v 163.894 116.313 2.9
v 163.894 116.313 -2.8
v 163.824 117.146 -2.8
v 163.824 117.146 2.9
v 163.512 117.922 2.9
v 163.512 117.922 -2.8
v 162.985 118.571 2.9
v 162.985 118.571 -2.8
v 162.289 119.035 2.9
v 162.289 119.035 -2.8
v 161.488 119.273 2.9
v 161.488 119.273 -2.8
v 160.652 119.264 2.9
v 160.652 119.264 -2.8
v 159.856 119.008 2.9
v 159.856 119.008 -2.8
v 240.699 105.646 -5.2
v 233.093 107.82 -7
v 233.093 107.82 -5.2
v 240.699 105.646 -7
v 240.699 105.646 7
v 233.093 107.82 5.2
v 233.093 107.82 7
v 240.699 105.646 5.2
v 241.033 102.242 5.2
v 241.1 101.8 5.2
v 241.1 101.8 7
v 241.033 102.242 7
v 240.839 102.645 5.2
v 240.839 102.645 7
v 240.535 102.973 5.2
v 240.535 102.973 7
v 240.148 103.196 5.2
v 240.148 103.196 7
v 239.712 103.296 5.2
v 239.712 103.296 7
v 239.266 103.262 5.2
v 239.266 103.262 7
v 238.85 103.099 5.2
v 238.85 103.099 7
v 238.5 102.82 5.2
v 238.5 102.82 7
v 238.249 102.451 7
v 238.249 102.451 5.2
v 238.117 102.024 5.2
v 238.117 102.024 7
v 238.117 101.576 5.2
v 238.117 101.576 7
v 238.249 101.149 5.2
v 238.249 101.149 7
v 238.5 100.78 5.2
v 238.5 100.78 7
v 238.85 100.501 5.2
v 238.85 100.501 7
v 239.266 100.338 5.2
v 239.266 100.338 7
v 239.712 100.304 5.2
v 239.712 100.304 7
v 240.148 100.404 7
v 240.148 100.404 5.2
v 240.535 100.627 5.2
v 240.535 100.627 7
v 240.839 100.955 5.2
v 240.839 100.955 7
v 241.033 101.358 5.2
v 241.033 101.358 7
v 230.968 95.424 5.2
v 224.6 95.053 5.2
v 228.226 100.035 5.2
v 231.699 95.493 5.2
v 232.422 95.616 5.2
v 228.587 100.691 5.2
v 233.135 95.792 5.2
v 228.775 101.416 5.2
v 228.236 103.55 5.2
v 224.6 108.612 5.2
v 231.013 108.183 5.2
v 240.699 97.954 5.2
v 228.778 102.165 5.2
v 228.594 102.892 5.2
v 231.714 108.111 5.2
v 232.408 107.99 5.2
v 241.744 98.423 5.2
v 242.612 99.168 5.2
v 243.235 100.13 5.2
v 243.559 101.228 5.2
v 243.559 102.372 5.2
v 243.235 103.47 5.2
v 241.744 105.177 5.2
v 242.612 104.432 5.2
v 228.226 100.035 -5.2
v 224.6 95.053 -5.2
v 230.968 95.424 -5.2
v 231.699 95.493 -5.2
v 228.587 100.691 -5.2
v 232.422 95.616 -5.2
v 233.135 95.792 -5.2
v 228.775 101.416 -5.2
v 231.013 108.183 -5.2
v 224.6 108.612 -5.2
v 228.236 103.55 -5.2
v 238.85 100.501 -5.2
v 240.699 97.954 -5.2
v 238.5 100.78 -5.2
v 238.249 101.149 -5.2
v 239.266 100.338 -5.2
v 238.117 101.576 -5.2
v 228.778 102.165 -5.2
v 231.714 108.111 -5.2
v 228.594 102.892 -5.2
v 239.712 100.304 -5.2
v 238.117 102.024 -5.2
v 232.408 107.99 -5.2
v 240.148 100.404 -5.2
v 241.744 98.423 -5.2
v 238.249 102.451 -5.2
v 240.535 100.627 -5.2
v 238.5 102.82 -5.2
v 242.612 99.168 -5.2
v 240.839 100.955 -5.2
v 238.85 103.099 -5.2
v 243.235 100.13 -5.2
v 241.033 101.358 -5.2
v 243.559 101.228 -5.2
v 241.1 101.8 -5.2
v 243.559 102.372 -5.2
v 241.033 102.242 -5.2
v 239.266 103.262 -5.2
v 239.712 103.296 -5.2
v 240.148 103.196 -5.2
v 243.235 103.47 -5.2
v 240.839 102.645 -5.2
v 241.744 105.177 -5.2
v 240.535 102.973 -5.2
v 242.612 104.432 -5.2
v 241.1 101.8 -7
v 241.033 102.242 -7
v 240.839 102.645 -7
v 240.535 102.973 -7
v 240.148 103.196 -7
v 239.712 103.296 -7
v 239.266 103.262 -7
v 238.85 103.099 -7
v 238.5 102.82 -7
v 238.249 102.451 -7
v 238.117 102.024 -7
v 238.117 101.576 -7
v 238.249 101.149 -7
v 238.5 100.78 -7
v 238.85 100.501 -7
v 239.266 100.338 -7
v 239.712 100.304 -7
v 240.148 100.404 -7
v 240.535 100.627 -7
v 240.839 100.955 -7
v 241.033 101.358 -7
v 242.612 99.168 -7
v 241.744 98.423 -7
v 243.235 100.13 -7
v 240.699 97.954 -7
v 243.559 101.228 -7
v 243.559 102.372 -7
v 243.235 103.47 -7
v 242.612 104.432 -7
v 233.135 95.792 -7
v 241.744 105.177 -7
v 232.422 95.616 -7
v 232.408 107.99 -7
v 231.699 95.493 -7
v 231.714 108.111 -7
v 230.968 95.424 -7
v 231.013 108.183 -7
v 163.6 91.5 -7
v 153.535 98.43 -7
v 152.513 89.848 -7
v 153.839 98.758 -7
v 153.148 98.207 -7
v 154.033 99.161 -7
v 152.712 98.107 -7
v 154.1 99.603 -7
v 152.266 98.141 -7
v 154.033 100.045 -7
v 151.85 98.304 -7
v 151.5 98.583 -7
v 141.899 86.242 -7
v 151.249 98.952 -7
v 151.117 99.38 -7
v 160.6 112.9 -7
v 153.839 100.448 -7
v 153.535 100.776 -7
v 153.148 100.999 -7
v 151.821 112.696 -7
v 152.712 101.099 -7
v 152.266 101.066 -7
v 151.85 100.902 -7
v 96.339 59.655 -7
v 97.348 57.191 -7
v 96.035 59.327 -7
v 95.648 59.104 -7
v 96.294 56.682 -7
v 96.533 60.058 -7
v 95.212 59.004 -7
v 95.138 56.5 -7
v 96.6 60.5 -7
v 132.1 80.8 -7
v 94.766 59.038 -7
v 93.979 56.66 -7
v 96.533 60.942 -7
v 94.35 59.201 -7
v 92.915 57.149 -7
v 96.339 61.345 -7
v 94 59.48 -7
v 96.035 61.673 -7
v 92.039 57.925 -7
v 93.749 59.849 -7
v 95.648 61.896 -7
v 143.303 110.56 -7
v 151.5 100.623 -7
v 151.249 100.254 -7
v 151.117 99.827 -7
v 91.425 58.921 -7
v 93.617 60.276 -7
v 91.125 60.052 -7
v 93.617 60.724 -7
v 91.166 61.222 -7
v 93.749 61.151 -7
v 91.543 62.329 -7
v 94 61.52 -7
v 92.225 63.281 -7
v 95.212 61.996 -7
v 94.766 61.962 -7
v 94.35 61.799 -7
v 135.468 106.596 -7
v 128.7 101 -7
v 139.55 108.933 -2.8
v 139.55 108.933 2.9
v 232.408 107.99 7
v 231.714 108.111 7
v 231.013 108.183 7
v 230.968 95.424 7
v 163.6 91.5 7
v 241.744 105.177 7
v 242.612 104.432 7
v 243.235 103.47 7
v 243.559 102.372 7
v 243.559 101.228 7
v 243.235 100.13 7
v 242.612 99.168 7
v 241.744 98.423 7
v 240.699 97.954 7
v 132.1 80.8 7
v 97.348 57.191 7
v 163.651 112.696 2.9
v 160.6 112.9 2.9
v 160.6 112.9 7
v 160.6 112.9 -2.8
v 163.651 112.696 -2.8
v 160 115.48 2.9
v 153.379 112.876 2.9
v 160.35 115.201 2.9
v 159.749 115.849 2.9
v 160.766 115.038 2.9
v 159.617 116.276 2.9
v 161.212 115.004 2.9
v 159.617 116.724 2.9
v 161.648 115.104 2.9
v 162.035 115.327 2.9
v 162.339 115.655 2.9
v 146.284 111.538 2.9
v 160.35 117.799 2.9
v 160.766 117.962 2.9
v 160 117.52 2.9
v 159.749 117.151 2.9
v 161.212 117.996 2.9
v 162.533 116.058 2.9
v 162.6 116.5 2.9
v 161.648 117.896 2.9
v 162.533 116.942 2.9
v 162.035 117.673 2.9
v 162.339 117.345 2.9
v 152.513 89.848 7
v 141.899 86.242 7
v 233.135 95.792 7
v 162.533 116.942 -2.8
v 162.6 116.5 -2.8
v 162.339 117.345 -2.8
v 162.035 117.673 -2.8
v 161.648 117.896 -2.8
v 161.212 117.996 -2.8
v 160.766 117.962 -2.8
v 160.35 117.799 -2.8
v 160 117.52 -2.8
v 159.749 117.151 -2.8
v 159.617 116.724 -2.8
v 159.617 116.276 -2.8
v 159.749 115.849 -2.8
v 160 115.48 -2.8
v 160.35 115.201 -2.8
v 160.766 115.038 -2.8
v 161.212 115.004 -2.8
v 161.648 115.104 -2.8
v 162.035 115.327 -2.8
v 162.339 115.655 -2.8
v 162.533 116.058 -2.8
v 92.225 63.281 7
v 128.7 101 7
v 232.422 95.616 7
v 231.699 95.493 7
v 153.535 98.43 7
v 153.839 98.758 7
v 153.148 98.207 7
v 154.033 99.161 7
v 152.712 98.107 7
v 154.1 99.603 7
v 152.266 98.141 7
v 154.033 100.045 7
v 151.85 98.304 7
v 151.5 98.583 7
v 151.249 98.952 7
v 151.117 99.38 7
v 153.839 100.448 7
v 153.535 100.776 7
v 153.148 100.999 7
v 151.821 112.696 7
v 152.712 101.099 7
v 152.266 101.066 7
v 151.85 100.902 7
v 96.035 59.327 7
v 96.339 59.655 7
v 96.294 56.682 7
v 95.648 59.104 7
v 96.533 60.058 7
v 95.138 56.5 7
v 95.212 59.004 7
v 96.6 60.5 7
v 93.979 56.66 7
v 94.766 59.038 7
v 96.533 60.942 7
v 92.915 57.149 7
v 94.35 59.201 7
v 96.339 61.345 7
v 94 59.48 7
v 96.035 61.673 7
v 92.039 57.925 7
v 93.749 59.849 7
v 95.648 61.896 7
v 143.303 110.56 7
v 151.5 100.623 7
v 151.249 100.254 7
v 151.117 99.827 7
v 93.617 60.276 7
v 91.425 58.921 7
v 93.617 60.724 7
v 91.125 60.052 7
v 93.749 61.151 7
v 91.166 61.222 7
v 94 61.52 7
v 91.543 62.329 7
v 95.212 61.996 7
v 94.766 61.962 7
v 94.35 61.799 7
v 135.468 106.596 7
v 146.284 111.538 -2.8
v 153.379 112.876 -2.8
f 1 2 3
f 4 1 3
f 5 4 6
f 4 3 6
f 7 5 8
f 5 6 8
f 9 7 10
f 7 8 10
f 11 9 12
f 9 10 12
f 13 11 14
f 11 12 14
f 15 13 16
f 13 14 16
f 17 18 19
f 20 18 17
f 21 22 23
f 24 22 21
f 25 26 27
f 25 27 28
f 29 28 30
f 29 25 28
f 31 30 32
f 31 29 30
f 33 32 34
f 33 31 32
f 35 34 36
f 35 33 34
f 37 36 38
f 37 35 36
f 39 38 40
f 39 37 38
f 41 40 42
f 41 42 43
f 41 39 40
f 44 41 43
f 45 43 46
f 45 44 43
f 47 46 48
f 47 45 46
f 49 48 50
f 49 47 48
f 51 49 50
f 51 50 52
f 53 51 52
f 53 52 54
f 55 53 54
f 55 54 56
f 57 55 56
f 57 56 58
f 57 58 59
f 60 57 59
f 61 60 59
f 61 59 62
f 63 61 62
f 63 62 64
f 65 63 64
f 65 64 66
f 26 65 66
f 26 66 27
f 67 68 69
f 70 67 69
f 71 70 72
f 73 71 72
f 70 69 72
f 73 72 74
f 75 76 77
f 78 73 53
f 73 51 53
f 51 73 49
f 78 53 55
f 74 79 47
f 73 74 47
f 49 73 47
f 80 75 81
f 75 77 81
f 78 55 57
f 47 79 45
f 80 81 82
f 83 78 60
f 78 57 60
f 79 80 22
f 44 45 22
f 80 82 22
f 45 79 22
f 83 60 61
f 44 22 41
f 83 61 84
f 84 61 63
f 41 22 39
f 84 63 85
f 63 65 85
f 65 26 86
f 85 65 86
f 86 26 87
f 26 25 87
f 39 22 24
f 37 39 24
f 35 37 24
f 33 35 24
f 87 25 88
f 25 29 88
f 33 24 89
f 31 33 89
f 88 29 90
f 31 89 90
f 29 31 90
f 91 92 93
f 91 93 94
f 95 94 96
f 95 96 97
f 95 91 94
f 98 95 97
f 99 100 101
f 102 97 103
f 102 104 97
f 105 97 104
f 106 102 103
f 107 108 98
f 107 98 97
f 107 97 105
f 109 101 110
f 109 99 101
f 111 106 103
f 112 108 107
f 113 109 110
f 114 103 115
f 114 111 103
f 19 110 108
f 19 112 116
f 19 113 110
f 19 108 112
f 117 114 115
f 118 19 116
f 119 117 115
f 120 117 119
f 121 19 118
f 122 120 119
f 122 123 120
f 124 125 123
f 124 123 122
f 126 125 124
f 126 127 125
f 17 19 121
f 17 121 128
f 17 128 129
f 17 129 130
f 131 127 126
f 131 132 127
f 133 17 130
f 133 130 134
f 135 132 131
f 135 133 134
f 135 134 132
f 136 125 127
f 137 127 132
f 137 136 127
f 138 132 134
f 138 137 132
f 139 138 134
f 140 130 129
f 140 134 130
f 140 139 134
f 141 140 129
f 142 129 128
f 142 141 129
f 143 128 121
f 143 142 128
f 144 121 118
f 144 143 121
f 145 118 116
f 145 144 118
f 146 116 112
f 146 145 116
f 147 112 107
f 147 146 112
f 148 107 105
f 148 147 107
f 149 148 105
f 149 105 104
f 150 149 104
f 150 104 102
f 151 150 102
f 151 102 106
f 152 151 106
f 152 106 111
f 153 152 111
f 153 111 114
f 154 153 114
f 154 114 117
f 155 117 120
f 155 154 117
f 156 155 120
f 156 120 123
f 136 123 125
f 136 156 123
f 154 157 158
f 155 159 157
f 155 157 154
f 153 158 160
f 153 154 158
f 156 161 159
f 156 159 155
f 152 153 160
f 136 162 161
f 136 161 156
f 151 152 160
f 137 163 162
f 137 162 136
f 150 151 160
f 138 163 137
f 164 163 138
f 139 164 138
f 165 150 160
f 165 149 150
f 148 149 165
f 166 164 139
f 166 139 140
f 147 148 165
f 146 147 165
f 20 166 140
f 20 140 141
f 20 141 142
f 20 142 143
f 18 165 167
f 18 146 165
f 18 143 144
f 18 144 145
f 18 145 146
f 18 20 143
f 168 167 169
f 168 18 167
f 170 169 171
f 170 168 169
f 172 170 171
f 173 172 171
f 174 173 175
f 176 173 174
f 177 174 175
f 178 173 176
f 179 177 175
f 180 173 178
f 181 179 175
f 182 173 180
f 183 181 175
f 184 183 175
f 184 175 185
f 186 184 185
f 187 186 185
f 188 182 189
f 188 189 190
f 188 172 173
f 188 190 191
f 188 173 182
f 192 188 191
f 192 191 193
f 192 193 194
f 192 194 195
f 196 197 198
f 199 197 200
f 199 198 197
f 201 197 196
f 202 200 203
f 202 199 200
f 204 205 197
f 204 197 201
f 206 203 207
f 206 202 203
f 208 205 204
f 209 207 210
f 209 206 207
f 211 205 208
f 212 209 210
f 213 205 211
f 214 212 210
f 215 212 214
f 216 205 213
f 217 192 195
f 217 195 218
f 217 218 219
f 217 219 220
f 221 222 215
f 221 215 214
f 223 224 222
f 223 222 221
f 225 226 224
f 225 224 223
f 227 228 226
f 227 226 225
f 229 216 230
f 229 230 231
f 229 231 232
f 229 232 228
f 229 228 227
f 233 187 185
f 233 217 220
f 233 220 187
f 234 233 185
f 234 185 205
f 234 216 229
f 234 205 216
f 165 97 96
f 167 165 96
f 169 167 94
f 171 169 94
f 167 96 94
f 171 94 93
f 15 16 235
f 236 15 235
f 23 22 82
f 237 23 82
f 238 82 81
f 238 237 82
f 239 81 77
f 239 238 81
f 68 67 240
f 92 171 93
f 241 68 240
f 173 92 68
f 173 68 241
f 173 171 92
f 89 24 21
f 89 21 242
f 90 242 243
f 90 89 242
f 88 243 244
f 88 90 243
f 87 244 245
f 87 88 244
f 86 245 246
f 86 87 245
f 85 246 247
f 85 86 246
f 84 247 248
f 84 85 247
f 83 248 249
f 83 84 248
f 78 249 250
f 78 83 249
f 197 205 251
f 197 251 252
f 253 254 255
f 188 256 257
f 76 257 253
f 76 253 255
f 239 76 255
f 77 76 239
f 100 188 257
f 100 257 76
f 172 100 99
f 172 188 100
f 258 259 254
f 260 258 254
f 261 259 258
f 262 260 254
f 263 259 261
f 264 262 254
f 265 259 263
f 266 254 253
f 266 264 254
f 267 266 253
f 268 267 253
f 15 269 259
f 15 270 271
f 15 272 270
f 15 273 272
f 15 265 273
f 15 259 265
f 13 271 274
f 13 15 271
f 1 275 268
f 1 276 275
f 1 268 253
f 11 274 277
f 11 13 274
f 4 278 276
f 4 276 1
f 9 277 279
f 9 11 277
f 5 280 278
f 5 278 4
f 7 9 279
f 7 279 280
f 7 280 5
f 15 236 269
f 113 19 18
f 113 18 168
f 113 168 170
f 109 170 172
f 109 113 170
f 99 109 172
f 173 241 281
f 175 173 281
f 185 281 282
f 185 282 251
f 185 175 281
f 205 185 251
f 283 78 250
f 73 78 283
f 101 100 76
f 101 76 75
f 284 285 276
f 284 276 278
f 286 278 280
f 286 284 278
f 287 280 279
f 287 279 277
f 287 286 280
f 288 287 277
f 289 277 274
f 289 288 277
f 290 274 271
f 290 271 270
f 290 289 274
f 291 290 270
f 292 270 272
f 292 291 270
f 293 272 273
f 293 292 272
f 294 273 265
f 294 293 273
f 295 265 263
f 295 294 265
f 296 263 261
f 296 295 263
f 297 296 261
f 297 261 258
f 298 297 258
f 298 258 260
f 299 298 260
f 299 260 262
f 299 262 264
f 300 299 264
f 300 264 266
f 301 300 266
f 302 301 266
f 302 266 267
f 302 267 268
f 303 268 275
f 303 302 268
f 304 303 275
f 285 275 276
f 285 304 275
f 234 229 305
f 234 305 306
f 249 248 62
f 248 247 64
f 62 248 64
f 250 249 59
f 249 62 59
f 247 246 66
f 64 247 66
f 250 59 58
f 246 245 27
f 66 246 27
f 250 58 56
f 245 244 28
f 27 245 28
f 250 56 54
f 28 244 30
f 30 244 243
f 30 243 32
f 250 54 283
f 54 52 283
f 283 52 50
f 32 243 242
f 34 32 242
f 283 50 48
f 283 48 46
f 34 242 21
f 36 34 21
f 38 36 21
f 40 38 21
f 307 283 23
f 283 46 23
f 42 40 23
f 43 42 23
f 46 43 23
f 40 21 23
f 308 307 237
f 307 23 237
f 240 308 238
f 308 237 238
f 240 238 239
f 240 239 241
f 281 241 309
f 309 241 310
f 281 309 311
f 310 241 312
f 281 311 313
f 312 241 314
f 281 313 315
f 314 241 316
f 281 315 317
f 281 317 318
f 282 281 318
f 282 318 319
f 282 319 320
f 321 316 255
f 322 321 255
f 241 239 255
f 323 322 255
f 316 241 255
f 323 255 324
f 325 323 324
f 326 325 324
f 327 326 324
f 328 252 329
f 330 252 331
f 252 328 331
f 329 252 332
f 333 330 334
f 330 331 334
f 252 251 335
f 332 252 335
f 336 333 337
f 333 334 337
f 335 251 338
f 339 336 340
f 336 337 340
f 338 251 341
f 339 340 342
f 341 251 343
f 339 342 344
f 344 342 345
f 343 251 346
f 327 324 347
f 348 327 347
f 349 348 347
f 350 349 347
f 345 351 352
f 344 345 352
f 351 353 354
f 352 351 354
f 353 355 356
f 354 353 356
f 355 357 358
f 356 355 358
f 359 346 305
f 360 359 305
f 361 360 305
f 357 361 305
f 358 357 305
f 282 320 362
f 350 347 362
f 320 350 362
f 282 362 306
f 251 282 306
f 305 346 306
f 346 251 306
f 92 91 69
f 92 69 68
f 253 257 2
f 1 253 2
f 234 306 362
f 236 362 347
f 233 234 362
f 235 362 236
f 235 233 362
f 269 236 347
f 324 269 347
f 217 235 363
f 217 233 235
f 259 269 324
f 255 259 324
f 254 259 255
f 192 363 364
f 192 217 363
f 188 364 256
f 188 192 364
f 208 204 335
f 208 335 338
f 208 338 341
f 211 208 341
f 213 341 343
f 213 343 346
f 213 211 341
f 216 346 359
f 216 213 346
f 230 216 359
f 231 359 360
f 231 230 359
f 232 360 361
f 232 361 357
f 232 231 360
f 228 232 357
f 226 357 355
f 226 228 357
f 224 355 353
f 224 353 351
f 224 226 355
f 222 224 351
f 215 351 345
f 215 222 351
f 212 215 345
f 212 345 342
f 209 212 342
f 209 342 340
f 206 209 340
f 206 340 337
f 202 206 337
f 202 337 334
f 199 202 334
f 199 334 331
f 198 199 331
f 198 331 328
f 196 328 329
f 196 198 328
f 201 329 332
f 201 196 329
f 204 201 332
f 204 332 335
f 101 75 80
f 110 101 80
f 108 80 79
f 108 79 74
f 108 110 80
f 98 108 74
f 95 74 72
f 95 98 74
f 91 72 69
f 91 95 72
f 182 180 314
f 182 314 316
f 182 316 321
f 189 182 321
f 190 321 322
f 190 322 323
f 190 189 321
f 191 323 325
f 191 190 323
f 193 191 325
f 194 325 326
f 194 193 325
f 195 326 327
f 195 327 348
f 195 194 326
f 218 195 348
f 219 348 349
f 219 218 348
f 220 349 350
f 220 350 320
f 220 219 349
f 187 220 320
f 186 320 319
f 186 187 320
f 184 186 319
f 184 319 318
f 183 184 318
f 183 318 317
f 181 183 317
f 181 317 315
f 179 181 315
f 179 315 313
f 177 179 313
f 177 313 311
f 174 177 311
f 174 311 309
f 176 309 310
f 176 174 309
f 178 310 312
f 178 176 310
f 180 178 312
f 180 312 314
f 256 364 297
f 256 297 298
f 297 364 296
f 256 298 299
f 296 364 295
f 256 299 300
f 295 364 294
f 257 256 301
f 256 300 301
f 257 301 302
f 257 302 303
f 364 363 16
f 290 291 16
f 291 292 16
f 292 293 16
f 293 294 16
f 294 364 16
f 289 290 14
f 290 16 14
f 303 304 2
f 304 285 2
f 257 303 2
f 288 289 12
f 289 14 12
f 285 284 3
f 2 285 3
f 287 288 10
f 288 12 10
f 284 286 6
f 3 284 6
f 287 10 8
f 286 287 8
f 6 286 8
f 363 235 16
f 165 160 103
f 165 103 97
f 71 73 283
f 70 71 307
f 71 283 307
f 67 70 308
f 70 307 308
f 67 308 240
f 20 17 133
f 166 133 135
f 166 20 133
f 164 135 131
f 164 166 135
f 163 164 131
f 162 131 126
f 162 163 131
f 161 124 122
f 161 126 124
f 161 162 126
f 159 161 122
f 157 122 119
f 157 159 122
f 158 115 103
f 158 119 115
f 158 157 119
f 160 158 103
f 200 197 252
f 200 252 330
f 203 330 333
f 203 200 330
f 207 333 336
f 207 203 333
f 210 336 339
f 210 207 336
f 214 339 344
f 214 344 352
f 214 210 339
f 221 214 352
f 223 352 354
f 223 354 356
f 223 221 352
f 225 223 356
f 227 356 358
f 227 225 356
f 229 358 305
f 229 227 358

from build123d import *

# Parameters (mm, degrees)
EXTRUDE_1_DEPTH          = 7
EXTRUDE_1_DEPTH_BACK     = 7
SKETCH_1_R               = 1.5
FILLET_1_R               = 10
EXTRUDE_2_DEPTH          = 2.9
EXTRUDE_2_DEPTH_BACK     = 2.8
SKETCH_3_R               = 1.5
CUT_EXTRUDE_1_DEPTH      = 5.2
CUT_EXTRUDE_1_DEPTH_BACK = 5.2


with BuildPart() as part:
    # 草图1 → 凸台-拉伸1 (new, two sides: drawn at the far end of the back side and taken through both)
    with BuildSketch(Plane.XY.offset(-EXTRUDE_1_DEPTH_BACK)):
        with BuildLine():
            ThreePointArc((132.1, 80.8), (147.125308547, 88.283437456), (163.6, 91.5))
            Line((163.6, 91.5), (232.071936087, 95.488208898))
            Line((232.071936087, 95.488208898), (240.699236038, 97.954004663))
            ThreePointArc((240.699236038, 97.954004663), (243.6, 101.8), (240.699236038, 105.645995337))
            Line((240.699236038, 105.645995337), (232.071936087, 108.111791102))
            Line((232.071936087, 108.111791102), (160.6, 112.9))
            ThreePointArc((160.6, 112.9), (143.303490983, 110.55954938), (128.7, 101))
            Line((128.7, 101), (92.224555949, 63.280615311))
            ThreePointArc((92.224555949, 63.280615311), (92.03920173, 57.924827394), (97.347754748, 57.19128445))
            Line((97.347754748, 57.19128445), (132.1, 80.8))
        make_face()
        with Locations((95.1, 60.5)):
            Circle(SKETCH_1_R, mode=Mode.SUBTRACT)
        with Locations((152.6, 99.603139307)):
            Circle(SKETCH_1_R, mode=Mode.SUBTRACT)
        with Locations((239.6, 101.8)):
            Circle(SKETCH_1_R, mode=Mode.SUBTRACT)
    extrude(amount=EXTRUDE_1_DEPTH + EXTRUDE_1_DEPTH_BACK)

    # 圆角1
    fillet_1_edges = [part.edges().sort_by_distance(p)[0] for p in [
        (232.071936087, 95.488208898, 0),
        (232.071936087, 108.111791102, 0),
    ]]
    fillet(fillet_1_edges, radius=FILLET_1_R)

    # 草图3 → 凸台-拉伸2 (add, two sides: drawn at the far end of the back side and taken through both)
    with BuildSketch(Plane.XY.offset(-EXTRUDE_2_DEPTH_BACK)):
        with BuildLine():
            Line((160.6, 112.9), (163.651401787, 112.69557362))
            Line((163.651401787, 112.69557362), (163.893737551, 116.312835642))
            ThreePointArc((163.893737551, 116.312835642), (162.654460758, 118.828873494), (159.855517856, 119.008239262))
            Line((159.855517856, 119.008239262), (139.549521827, 108.933263618))
            ThreePointArc((139.549521827, 108.933263618), (149.801009446, 112.369362402), (160.6, 112.9))
        make_face()
        with Locations((161.1, 116.5)):
            Circle(SKETCH_3_R, mode=Mode.SUBTRACT)
    extrude(amount=EXTRUDE_2_DEPTH + EXTRUDE_2_DEPTH_BACK)

    # 草图4 → 切除-拉伸1 (cut, two sides: drawn at the far end of the back side and taken through both)
    with BuildSketch(Plane.XY.offset(-CUT_EXTRUDE_1_DEPTH_BACK)):
        with BuildLine():
            Line((231.012866709, 108.182742662), (224.6, 108.612367871))
            Line((224.6, 108.612367871), (228.236474469, 103.550312019))
            ThreePointArc((228.236474469, 103.550312019), (228.799985675, 101.790729145), (228.225610058, 100.034662683))
            Line((228.225610058, 100.034662683), (224.6, 95.052999327))
            Line((224.6, 95.052999327), (230.968280992, 95.423925524))
            ThreePointArc((230.968280992, 95.423925524), (232.061731819, 95.548272011), (233.134897693, 95.792017302))
            Line((233.134897693, 95.792017302), (240.699236038, 97.954004663))
            ThreePointArc((240.699236038, 97.954004663), (243.6, 101.8), (240.699236038, 105.645995337))
            Line((240.699236038, 105.645995337), (233.092512669, 107.820096895))
            ThreePointArc((233.092512669, 107.820096895), (232.062285935, 108.056450871), (231.012866709, 108.182742662))
        make_face()
    extrude(amount=CUT_EXTRUDE_1_DEPTH + CUT_EXTRUDE_1_DEPTH_BACK, mode=Mode.SUBTRACT)


solid = part.part
